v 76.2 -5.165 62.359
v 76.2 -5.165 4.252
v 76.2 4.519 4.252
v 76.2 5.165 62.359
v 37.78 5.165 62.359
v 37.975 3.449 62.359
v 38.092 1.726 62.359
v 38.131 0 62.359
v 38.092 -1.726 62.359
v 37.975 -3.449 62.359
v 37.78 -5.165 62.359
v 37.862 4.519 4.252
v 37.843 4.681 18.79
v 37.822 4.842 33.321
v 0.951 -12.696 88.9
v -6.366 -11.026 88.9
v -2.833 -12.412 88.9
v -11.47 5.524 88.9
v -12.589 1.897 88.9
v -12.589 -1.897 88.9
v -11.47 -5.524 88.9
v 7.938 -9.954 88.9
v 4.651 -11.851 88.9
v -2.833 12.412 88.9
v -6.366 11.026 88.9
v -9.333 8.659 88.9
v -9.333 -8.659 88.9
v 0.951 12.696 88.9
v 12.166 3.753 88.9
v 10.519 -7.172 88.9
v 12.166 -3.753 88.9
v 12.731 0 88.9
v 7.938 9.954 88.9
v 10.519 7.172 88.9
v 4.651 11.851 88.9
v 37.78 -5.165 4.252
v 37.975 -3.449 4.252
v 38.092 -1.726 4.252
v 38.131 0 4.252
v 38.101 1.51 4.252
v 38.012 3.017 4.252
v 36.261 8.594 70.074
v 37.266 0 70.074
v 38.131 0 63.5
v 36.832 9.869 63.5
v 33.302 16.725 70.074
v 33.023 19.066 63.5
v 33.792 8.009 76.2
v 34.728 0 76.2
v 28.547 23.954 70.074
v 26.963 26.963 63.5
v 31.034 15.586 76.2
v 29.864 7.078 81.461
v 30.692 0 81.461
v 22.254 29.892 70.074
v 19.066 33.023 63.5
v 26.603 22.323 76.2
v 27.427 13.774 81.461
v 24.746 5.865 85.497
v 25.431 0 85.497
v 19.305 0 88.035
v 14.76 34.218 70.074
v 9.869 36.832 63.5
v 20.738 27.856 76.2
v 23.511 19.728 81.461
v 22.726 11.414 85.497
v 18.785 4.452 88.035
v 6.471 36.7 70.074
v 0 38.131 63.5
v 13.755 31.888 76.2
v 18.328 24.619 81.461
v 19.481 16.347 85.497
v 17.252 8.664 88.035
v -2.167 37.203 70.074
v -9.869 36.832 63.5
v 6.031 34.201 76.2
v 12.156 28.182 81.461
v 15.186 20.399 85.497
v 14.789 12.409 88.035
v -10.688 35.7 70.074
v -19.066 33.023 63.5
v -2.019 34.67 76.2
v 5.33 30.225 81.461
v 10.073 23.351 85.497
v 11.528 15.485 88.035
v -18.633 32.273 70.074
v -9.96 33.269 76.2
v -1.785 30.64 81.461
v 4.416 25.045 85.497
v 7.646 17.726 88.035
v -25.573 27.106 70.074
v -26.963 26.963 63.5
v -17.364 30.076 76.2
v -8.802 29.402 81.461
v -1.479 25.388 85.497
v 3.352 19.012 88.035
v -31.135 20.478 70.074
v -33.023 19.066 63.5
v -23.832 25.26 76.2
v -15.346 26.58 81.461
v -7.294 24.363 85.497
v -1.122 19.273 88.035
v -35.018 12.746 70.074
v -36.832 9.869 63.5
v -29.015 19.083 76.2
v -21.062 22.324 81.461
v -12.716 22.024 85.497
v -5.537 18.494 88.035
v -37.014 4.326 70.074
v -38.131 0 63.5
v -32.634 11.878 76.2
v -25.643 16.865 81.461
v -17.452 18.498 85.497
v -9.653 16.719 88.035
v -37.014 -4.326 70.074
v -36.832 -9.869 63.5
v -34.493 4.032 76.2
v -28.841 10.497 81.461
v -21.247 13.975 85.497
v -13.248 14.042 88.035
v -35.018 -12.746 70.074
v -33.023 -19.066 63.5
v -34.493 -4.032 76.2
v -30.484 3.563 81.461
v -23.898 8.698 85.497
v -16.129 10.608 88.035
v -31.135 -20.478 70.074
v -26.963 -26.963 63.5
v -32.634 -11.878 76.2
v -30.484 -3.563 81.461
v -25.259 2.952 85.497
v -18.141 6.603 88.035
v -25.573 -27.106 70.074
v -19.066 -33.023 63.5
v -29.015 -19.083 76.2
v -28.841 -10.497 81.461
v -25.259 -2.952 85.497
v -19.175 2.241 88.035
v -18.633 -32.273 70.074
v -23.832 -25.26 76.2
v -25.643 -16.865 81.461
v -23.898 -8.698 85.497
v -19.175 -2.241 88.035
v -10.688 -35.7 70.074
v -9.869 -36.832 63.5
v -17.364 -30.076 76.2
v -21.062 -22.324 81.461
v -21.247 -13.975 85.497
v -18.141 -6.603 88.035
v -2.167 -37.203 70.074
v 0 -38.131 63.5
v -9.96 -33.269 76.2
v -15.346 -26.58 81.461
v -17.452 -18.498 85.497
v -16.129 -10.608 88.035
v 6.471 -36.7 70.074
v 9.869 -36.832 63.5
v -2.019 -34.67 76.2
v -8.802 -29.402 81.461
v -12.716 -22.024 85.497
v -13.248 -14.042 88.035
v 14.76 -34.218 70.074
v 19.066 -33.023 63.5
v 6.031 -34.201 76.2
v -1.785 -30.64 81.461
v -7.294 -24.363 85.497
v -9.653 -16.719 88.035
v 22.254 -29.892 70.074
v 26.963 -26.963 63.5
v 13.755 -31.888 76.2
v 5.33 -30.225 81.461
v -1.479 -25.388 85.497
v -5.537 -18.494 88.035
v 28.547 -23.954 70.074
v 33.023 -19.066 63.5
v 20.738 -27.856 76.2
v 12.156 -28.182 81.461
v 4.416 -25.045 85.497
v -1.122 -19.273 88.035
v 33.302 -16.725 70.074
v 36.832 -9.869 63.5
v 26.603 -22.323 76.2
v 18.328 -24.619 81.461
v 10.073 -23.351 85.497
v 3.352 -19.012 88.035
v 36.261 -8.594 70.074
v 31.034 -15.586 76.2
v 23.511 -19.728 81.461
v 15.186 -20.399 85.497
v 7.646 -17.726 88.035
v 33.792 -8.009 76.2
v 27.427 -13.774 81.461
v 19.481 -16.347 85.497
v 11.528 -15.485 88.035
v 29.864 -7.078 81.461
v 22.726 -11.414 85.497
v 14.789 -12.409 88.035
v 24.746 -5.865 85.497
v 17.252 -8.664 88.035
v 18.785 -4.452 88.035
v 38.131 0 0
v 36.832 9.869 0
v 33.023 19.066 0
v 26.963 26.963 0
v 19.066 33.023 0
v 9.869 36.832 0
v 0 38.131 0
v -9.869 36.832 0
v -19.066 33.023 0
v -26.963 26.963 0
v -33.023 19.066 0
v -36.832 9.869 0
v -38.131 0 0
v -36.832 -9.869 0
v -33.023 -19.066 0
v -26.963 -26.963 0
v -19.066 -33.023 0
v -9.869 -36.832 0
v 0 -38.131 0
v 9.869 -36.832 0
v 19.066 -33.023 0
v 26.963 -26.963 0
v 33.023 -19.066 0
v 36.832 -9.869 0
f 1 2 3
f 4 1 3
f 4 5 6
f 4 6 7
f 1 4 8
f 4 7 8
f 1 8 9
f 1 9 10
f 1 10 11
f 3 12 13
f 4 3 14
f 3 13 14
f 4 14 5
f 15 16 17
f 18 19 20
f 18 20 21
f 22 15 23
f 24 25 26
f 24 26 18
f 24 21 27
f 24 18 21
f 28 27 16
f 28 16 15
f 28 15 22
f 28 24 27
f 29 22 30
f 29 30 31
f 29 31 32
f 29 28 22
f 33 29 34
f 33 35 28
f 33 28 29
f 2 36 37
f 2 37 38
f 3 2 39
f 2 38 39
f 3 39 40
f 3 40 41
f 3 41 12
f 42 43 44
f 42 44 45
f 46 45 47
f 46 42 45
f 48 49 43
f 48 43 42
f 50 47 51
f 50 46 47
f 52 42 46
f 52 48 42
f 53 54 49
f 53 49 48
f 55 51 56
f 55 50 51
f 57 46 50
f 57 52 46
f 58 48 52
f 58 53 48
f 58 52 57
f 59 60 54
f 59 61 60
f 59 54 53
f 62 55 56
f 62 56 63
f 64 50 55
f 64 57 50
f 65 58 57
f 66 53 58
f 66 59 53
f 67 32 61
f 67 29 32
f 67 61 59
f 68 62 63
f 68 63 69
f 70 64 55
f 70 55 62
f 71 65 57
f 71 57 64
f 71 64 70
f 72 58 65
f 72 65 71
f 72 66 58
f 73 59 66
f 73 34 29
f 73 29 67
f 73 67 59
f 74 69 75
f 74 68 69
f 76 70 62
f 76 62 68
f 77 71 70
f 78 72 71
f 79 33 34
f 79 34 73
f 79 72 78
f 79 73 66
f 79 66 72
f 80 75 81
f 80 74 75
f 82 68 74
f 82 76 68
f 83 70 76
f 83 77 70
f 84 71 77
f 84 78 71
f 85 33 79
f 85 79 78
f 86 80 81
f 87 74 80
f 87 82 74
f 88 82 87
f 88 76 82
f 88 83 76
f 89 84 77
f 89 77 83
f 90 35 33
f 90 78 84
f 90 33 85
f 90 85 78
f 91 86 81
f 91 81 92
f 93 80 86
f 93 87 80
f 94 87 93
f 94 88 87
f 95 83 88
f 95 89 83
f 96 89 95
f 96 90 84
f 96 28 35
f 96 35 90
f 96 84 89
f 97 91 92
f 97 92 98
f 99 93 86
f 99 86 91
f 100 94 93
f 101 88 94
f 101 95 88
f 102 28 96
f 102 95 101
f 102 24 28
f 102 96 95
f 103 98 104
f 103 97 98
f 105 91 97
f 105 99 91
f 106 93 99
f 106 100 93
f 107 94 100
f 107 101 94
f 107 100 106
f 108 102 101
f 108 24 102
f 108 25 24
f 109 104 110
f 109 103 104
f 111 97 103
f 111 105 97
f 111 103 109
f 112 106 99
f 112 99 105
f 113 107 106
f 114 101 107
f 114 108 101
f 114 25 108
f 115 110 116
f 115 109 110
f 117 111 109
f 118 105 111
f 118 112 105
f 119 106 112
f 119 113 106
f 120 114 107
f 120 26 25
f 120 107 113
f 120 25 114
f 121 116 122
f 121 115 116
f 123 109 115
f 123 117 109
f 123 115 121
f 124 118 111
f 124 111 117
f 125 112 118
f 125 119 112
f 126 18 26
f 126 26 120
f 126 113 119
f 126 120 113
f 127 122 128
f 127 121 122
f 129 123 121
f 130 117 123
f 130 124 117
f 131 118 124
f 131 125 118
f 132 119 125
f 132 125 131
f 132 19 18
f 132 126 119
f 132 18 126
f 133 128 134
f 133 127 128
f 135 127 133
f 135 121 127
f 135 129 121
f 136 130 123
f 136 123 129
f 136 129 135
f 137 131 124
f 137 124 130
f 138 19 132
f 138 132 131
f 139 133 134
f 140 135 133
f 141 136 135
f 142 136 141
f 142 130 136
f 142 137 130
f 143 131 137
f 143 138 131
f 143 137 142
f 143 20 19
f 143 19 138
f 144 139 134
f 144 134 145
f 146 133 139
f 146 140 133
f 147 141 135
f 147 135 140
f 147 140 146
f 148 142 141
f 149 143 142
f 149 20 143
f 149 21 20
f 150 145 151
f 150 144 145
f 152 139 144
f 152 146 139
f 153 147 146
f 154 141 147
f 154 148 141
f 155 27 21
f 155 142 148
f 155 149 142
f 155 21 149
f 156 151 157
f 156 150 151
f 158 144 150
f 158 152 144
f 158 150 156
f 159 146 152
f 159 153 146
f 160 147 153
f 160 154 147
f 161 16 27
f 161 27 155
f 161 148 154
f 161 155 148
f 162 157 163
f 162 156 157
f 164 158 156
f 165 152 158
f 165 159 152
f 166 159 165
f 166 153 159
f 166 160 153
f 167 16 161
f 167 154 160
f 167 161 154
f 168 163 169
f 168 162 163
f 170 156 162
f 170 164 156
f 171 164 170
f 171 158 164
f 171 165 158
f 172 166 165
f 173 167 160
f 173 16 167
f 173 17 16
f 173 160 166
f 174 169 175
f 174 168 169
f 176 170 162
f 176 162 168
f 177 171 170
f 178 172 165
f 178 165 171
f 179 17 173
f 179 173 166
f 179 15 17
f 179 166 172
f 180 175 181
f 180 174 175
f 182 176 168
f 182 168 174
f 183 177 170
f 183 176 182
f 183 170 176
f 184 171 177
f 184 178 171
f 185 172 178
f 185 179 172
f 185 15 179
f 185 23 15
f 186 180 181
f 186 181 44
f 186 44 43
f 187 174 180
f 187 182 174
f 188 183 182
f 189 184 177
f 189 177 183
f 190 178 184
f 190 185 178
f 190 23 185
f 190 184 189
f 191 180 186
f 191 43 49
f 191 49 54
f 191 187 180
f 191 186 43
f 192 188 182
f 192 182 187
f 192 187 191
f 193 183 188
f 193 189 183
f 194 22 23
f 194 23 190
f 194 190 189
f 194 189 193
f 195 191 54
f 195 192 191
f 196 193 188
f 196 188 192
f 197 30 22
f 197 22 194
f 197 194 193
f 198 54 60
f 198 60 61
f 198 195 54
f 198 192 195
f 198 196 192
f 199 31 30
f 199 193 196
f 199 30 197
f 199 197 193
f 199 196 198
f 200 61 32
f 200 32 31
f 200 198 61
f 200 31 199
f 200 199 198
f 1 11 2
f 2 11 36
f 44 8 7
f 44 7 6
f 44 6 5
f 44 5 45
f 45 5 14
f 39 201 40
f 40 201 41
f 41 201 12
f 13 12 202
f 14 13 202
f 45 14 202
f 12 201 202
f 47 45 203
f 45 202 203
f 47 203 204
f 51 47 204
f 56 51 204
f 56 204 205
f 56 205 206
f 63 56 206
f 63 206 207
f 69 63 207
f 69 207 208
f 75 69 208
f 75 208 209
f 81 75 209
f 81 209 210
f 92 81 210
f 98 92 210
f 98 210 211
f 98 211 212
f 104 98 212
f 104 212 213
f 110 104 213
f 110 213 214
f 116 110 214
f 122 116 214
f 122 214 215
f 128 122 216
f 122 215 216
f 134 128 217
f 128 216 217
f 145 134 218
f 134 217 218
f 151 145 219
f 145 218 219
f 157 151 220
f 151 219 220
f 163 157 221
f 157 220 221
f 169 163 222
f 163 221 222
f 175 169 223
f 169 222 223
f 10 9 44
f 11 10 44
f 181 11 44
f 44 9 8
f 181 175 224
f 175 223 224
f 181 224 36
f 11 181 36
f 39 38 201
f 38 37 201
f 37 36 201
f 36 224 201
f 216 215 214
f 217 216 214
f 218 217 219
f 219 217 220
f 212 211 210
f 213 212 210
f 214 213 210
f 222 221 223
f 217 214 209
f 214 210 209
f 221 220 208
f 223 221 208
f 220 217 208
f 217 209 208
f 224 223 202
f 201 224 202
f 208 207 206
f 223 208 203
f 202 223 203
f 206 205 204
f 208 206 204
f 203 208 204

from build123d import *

# Parameters (mm, degrees)
F0_R     = 38.131221
F1_DEPTH = 88.9
F2_R     = 25.4
F4_DEPTH = 76.2


with BuildPart() as f1:
    # F0 (on Top) → F1 (new body)
    with BuildSketch(Plane.XY):
        Circle(F0_R)
    extrude(amount=F1_DEPTH)

    # F2
    f2_edges = [f1.edges().sort_by_distance(p)[0] for p in [
        (-38.131221, 0, 88.9),
    ]]
    fillet(f2_edges, radius=F2_R)

    # F3 (on Right) → F4 (join)
    with BuildSketch(Plane.YZ):
        Polygon((4.519497, 4.251661), (5.16514, 62.359482), (-5.165141, 62.359482), (-5.165141, 4.251661), align=None)
    extrude(amount=F4_DEPTH)


solid = f1.part
